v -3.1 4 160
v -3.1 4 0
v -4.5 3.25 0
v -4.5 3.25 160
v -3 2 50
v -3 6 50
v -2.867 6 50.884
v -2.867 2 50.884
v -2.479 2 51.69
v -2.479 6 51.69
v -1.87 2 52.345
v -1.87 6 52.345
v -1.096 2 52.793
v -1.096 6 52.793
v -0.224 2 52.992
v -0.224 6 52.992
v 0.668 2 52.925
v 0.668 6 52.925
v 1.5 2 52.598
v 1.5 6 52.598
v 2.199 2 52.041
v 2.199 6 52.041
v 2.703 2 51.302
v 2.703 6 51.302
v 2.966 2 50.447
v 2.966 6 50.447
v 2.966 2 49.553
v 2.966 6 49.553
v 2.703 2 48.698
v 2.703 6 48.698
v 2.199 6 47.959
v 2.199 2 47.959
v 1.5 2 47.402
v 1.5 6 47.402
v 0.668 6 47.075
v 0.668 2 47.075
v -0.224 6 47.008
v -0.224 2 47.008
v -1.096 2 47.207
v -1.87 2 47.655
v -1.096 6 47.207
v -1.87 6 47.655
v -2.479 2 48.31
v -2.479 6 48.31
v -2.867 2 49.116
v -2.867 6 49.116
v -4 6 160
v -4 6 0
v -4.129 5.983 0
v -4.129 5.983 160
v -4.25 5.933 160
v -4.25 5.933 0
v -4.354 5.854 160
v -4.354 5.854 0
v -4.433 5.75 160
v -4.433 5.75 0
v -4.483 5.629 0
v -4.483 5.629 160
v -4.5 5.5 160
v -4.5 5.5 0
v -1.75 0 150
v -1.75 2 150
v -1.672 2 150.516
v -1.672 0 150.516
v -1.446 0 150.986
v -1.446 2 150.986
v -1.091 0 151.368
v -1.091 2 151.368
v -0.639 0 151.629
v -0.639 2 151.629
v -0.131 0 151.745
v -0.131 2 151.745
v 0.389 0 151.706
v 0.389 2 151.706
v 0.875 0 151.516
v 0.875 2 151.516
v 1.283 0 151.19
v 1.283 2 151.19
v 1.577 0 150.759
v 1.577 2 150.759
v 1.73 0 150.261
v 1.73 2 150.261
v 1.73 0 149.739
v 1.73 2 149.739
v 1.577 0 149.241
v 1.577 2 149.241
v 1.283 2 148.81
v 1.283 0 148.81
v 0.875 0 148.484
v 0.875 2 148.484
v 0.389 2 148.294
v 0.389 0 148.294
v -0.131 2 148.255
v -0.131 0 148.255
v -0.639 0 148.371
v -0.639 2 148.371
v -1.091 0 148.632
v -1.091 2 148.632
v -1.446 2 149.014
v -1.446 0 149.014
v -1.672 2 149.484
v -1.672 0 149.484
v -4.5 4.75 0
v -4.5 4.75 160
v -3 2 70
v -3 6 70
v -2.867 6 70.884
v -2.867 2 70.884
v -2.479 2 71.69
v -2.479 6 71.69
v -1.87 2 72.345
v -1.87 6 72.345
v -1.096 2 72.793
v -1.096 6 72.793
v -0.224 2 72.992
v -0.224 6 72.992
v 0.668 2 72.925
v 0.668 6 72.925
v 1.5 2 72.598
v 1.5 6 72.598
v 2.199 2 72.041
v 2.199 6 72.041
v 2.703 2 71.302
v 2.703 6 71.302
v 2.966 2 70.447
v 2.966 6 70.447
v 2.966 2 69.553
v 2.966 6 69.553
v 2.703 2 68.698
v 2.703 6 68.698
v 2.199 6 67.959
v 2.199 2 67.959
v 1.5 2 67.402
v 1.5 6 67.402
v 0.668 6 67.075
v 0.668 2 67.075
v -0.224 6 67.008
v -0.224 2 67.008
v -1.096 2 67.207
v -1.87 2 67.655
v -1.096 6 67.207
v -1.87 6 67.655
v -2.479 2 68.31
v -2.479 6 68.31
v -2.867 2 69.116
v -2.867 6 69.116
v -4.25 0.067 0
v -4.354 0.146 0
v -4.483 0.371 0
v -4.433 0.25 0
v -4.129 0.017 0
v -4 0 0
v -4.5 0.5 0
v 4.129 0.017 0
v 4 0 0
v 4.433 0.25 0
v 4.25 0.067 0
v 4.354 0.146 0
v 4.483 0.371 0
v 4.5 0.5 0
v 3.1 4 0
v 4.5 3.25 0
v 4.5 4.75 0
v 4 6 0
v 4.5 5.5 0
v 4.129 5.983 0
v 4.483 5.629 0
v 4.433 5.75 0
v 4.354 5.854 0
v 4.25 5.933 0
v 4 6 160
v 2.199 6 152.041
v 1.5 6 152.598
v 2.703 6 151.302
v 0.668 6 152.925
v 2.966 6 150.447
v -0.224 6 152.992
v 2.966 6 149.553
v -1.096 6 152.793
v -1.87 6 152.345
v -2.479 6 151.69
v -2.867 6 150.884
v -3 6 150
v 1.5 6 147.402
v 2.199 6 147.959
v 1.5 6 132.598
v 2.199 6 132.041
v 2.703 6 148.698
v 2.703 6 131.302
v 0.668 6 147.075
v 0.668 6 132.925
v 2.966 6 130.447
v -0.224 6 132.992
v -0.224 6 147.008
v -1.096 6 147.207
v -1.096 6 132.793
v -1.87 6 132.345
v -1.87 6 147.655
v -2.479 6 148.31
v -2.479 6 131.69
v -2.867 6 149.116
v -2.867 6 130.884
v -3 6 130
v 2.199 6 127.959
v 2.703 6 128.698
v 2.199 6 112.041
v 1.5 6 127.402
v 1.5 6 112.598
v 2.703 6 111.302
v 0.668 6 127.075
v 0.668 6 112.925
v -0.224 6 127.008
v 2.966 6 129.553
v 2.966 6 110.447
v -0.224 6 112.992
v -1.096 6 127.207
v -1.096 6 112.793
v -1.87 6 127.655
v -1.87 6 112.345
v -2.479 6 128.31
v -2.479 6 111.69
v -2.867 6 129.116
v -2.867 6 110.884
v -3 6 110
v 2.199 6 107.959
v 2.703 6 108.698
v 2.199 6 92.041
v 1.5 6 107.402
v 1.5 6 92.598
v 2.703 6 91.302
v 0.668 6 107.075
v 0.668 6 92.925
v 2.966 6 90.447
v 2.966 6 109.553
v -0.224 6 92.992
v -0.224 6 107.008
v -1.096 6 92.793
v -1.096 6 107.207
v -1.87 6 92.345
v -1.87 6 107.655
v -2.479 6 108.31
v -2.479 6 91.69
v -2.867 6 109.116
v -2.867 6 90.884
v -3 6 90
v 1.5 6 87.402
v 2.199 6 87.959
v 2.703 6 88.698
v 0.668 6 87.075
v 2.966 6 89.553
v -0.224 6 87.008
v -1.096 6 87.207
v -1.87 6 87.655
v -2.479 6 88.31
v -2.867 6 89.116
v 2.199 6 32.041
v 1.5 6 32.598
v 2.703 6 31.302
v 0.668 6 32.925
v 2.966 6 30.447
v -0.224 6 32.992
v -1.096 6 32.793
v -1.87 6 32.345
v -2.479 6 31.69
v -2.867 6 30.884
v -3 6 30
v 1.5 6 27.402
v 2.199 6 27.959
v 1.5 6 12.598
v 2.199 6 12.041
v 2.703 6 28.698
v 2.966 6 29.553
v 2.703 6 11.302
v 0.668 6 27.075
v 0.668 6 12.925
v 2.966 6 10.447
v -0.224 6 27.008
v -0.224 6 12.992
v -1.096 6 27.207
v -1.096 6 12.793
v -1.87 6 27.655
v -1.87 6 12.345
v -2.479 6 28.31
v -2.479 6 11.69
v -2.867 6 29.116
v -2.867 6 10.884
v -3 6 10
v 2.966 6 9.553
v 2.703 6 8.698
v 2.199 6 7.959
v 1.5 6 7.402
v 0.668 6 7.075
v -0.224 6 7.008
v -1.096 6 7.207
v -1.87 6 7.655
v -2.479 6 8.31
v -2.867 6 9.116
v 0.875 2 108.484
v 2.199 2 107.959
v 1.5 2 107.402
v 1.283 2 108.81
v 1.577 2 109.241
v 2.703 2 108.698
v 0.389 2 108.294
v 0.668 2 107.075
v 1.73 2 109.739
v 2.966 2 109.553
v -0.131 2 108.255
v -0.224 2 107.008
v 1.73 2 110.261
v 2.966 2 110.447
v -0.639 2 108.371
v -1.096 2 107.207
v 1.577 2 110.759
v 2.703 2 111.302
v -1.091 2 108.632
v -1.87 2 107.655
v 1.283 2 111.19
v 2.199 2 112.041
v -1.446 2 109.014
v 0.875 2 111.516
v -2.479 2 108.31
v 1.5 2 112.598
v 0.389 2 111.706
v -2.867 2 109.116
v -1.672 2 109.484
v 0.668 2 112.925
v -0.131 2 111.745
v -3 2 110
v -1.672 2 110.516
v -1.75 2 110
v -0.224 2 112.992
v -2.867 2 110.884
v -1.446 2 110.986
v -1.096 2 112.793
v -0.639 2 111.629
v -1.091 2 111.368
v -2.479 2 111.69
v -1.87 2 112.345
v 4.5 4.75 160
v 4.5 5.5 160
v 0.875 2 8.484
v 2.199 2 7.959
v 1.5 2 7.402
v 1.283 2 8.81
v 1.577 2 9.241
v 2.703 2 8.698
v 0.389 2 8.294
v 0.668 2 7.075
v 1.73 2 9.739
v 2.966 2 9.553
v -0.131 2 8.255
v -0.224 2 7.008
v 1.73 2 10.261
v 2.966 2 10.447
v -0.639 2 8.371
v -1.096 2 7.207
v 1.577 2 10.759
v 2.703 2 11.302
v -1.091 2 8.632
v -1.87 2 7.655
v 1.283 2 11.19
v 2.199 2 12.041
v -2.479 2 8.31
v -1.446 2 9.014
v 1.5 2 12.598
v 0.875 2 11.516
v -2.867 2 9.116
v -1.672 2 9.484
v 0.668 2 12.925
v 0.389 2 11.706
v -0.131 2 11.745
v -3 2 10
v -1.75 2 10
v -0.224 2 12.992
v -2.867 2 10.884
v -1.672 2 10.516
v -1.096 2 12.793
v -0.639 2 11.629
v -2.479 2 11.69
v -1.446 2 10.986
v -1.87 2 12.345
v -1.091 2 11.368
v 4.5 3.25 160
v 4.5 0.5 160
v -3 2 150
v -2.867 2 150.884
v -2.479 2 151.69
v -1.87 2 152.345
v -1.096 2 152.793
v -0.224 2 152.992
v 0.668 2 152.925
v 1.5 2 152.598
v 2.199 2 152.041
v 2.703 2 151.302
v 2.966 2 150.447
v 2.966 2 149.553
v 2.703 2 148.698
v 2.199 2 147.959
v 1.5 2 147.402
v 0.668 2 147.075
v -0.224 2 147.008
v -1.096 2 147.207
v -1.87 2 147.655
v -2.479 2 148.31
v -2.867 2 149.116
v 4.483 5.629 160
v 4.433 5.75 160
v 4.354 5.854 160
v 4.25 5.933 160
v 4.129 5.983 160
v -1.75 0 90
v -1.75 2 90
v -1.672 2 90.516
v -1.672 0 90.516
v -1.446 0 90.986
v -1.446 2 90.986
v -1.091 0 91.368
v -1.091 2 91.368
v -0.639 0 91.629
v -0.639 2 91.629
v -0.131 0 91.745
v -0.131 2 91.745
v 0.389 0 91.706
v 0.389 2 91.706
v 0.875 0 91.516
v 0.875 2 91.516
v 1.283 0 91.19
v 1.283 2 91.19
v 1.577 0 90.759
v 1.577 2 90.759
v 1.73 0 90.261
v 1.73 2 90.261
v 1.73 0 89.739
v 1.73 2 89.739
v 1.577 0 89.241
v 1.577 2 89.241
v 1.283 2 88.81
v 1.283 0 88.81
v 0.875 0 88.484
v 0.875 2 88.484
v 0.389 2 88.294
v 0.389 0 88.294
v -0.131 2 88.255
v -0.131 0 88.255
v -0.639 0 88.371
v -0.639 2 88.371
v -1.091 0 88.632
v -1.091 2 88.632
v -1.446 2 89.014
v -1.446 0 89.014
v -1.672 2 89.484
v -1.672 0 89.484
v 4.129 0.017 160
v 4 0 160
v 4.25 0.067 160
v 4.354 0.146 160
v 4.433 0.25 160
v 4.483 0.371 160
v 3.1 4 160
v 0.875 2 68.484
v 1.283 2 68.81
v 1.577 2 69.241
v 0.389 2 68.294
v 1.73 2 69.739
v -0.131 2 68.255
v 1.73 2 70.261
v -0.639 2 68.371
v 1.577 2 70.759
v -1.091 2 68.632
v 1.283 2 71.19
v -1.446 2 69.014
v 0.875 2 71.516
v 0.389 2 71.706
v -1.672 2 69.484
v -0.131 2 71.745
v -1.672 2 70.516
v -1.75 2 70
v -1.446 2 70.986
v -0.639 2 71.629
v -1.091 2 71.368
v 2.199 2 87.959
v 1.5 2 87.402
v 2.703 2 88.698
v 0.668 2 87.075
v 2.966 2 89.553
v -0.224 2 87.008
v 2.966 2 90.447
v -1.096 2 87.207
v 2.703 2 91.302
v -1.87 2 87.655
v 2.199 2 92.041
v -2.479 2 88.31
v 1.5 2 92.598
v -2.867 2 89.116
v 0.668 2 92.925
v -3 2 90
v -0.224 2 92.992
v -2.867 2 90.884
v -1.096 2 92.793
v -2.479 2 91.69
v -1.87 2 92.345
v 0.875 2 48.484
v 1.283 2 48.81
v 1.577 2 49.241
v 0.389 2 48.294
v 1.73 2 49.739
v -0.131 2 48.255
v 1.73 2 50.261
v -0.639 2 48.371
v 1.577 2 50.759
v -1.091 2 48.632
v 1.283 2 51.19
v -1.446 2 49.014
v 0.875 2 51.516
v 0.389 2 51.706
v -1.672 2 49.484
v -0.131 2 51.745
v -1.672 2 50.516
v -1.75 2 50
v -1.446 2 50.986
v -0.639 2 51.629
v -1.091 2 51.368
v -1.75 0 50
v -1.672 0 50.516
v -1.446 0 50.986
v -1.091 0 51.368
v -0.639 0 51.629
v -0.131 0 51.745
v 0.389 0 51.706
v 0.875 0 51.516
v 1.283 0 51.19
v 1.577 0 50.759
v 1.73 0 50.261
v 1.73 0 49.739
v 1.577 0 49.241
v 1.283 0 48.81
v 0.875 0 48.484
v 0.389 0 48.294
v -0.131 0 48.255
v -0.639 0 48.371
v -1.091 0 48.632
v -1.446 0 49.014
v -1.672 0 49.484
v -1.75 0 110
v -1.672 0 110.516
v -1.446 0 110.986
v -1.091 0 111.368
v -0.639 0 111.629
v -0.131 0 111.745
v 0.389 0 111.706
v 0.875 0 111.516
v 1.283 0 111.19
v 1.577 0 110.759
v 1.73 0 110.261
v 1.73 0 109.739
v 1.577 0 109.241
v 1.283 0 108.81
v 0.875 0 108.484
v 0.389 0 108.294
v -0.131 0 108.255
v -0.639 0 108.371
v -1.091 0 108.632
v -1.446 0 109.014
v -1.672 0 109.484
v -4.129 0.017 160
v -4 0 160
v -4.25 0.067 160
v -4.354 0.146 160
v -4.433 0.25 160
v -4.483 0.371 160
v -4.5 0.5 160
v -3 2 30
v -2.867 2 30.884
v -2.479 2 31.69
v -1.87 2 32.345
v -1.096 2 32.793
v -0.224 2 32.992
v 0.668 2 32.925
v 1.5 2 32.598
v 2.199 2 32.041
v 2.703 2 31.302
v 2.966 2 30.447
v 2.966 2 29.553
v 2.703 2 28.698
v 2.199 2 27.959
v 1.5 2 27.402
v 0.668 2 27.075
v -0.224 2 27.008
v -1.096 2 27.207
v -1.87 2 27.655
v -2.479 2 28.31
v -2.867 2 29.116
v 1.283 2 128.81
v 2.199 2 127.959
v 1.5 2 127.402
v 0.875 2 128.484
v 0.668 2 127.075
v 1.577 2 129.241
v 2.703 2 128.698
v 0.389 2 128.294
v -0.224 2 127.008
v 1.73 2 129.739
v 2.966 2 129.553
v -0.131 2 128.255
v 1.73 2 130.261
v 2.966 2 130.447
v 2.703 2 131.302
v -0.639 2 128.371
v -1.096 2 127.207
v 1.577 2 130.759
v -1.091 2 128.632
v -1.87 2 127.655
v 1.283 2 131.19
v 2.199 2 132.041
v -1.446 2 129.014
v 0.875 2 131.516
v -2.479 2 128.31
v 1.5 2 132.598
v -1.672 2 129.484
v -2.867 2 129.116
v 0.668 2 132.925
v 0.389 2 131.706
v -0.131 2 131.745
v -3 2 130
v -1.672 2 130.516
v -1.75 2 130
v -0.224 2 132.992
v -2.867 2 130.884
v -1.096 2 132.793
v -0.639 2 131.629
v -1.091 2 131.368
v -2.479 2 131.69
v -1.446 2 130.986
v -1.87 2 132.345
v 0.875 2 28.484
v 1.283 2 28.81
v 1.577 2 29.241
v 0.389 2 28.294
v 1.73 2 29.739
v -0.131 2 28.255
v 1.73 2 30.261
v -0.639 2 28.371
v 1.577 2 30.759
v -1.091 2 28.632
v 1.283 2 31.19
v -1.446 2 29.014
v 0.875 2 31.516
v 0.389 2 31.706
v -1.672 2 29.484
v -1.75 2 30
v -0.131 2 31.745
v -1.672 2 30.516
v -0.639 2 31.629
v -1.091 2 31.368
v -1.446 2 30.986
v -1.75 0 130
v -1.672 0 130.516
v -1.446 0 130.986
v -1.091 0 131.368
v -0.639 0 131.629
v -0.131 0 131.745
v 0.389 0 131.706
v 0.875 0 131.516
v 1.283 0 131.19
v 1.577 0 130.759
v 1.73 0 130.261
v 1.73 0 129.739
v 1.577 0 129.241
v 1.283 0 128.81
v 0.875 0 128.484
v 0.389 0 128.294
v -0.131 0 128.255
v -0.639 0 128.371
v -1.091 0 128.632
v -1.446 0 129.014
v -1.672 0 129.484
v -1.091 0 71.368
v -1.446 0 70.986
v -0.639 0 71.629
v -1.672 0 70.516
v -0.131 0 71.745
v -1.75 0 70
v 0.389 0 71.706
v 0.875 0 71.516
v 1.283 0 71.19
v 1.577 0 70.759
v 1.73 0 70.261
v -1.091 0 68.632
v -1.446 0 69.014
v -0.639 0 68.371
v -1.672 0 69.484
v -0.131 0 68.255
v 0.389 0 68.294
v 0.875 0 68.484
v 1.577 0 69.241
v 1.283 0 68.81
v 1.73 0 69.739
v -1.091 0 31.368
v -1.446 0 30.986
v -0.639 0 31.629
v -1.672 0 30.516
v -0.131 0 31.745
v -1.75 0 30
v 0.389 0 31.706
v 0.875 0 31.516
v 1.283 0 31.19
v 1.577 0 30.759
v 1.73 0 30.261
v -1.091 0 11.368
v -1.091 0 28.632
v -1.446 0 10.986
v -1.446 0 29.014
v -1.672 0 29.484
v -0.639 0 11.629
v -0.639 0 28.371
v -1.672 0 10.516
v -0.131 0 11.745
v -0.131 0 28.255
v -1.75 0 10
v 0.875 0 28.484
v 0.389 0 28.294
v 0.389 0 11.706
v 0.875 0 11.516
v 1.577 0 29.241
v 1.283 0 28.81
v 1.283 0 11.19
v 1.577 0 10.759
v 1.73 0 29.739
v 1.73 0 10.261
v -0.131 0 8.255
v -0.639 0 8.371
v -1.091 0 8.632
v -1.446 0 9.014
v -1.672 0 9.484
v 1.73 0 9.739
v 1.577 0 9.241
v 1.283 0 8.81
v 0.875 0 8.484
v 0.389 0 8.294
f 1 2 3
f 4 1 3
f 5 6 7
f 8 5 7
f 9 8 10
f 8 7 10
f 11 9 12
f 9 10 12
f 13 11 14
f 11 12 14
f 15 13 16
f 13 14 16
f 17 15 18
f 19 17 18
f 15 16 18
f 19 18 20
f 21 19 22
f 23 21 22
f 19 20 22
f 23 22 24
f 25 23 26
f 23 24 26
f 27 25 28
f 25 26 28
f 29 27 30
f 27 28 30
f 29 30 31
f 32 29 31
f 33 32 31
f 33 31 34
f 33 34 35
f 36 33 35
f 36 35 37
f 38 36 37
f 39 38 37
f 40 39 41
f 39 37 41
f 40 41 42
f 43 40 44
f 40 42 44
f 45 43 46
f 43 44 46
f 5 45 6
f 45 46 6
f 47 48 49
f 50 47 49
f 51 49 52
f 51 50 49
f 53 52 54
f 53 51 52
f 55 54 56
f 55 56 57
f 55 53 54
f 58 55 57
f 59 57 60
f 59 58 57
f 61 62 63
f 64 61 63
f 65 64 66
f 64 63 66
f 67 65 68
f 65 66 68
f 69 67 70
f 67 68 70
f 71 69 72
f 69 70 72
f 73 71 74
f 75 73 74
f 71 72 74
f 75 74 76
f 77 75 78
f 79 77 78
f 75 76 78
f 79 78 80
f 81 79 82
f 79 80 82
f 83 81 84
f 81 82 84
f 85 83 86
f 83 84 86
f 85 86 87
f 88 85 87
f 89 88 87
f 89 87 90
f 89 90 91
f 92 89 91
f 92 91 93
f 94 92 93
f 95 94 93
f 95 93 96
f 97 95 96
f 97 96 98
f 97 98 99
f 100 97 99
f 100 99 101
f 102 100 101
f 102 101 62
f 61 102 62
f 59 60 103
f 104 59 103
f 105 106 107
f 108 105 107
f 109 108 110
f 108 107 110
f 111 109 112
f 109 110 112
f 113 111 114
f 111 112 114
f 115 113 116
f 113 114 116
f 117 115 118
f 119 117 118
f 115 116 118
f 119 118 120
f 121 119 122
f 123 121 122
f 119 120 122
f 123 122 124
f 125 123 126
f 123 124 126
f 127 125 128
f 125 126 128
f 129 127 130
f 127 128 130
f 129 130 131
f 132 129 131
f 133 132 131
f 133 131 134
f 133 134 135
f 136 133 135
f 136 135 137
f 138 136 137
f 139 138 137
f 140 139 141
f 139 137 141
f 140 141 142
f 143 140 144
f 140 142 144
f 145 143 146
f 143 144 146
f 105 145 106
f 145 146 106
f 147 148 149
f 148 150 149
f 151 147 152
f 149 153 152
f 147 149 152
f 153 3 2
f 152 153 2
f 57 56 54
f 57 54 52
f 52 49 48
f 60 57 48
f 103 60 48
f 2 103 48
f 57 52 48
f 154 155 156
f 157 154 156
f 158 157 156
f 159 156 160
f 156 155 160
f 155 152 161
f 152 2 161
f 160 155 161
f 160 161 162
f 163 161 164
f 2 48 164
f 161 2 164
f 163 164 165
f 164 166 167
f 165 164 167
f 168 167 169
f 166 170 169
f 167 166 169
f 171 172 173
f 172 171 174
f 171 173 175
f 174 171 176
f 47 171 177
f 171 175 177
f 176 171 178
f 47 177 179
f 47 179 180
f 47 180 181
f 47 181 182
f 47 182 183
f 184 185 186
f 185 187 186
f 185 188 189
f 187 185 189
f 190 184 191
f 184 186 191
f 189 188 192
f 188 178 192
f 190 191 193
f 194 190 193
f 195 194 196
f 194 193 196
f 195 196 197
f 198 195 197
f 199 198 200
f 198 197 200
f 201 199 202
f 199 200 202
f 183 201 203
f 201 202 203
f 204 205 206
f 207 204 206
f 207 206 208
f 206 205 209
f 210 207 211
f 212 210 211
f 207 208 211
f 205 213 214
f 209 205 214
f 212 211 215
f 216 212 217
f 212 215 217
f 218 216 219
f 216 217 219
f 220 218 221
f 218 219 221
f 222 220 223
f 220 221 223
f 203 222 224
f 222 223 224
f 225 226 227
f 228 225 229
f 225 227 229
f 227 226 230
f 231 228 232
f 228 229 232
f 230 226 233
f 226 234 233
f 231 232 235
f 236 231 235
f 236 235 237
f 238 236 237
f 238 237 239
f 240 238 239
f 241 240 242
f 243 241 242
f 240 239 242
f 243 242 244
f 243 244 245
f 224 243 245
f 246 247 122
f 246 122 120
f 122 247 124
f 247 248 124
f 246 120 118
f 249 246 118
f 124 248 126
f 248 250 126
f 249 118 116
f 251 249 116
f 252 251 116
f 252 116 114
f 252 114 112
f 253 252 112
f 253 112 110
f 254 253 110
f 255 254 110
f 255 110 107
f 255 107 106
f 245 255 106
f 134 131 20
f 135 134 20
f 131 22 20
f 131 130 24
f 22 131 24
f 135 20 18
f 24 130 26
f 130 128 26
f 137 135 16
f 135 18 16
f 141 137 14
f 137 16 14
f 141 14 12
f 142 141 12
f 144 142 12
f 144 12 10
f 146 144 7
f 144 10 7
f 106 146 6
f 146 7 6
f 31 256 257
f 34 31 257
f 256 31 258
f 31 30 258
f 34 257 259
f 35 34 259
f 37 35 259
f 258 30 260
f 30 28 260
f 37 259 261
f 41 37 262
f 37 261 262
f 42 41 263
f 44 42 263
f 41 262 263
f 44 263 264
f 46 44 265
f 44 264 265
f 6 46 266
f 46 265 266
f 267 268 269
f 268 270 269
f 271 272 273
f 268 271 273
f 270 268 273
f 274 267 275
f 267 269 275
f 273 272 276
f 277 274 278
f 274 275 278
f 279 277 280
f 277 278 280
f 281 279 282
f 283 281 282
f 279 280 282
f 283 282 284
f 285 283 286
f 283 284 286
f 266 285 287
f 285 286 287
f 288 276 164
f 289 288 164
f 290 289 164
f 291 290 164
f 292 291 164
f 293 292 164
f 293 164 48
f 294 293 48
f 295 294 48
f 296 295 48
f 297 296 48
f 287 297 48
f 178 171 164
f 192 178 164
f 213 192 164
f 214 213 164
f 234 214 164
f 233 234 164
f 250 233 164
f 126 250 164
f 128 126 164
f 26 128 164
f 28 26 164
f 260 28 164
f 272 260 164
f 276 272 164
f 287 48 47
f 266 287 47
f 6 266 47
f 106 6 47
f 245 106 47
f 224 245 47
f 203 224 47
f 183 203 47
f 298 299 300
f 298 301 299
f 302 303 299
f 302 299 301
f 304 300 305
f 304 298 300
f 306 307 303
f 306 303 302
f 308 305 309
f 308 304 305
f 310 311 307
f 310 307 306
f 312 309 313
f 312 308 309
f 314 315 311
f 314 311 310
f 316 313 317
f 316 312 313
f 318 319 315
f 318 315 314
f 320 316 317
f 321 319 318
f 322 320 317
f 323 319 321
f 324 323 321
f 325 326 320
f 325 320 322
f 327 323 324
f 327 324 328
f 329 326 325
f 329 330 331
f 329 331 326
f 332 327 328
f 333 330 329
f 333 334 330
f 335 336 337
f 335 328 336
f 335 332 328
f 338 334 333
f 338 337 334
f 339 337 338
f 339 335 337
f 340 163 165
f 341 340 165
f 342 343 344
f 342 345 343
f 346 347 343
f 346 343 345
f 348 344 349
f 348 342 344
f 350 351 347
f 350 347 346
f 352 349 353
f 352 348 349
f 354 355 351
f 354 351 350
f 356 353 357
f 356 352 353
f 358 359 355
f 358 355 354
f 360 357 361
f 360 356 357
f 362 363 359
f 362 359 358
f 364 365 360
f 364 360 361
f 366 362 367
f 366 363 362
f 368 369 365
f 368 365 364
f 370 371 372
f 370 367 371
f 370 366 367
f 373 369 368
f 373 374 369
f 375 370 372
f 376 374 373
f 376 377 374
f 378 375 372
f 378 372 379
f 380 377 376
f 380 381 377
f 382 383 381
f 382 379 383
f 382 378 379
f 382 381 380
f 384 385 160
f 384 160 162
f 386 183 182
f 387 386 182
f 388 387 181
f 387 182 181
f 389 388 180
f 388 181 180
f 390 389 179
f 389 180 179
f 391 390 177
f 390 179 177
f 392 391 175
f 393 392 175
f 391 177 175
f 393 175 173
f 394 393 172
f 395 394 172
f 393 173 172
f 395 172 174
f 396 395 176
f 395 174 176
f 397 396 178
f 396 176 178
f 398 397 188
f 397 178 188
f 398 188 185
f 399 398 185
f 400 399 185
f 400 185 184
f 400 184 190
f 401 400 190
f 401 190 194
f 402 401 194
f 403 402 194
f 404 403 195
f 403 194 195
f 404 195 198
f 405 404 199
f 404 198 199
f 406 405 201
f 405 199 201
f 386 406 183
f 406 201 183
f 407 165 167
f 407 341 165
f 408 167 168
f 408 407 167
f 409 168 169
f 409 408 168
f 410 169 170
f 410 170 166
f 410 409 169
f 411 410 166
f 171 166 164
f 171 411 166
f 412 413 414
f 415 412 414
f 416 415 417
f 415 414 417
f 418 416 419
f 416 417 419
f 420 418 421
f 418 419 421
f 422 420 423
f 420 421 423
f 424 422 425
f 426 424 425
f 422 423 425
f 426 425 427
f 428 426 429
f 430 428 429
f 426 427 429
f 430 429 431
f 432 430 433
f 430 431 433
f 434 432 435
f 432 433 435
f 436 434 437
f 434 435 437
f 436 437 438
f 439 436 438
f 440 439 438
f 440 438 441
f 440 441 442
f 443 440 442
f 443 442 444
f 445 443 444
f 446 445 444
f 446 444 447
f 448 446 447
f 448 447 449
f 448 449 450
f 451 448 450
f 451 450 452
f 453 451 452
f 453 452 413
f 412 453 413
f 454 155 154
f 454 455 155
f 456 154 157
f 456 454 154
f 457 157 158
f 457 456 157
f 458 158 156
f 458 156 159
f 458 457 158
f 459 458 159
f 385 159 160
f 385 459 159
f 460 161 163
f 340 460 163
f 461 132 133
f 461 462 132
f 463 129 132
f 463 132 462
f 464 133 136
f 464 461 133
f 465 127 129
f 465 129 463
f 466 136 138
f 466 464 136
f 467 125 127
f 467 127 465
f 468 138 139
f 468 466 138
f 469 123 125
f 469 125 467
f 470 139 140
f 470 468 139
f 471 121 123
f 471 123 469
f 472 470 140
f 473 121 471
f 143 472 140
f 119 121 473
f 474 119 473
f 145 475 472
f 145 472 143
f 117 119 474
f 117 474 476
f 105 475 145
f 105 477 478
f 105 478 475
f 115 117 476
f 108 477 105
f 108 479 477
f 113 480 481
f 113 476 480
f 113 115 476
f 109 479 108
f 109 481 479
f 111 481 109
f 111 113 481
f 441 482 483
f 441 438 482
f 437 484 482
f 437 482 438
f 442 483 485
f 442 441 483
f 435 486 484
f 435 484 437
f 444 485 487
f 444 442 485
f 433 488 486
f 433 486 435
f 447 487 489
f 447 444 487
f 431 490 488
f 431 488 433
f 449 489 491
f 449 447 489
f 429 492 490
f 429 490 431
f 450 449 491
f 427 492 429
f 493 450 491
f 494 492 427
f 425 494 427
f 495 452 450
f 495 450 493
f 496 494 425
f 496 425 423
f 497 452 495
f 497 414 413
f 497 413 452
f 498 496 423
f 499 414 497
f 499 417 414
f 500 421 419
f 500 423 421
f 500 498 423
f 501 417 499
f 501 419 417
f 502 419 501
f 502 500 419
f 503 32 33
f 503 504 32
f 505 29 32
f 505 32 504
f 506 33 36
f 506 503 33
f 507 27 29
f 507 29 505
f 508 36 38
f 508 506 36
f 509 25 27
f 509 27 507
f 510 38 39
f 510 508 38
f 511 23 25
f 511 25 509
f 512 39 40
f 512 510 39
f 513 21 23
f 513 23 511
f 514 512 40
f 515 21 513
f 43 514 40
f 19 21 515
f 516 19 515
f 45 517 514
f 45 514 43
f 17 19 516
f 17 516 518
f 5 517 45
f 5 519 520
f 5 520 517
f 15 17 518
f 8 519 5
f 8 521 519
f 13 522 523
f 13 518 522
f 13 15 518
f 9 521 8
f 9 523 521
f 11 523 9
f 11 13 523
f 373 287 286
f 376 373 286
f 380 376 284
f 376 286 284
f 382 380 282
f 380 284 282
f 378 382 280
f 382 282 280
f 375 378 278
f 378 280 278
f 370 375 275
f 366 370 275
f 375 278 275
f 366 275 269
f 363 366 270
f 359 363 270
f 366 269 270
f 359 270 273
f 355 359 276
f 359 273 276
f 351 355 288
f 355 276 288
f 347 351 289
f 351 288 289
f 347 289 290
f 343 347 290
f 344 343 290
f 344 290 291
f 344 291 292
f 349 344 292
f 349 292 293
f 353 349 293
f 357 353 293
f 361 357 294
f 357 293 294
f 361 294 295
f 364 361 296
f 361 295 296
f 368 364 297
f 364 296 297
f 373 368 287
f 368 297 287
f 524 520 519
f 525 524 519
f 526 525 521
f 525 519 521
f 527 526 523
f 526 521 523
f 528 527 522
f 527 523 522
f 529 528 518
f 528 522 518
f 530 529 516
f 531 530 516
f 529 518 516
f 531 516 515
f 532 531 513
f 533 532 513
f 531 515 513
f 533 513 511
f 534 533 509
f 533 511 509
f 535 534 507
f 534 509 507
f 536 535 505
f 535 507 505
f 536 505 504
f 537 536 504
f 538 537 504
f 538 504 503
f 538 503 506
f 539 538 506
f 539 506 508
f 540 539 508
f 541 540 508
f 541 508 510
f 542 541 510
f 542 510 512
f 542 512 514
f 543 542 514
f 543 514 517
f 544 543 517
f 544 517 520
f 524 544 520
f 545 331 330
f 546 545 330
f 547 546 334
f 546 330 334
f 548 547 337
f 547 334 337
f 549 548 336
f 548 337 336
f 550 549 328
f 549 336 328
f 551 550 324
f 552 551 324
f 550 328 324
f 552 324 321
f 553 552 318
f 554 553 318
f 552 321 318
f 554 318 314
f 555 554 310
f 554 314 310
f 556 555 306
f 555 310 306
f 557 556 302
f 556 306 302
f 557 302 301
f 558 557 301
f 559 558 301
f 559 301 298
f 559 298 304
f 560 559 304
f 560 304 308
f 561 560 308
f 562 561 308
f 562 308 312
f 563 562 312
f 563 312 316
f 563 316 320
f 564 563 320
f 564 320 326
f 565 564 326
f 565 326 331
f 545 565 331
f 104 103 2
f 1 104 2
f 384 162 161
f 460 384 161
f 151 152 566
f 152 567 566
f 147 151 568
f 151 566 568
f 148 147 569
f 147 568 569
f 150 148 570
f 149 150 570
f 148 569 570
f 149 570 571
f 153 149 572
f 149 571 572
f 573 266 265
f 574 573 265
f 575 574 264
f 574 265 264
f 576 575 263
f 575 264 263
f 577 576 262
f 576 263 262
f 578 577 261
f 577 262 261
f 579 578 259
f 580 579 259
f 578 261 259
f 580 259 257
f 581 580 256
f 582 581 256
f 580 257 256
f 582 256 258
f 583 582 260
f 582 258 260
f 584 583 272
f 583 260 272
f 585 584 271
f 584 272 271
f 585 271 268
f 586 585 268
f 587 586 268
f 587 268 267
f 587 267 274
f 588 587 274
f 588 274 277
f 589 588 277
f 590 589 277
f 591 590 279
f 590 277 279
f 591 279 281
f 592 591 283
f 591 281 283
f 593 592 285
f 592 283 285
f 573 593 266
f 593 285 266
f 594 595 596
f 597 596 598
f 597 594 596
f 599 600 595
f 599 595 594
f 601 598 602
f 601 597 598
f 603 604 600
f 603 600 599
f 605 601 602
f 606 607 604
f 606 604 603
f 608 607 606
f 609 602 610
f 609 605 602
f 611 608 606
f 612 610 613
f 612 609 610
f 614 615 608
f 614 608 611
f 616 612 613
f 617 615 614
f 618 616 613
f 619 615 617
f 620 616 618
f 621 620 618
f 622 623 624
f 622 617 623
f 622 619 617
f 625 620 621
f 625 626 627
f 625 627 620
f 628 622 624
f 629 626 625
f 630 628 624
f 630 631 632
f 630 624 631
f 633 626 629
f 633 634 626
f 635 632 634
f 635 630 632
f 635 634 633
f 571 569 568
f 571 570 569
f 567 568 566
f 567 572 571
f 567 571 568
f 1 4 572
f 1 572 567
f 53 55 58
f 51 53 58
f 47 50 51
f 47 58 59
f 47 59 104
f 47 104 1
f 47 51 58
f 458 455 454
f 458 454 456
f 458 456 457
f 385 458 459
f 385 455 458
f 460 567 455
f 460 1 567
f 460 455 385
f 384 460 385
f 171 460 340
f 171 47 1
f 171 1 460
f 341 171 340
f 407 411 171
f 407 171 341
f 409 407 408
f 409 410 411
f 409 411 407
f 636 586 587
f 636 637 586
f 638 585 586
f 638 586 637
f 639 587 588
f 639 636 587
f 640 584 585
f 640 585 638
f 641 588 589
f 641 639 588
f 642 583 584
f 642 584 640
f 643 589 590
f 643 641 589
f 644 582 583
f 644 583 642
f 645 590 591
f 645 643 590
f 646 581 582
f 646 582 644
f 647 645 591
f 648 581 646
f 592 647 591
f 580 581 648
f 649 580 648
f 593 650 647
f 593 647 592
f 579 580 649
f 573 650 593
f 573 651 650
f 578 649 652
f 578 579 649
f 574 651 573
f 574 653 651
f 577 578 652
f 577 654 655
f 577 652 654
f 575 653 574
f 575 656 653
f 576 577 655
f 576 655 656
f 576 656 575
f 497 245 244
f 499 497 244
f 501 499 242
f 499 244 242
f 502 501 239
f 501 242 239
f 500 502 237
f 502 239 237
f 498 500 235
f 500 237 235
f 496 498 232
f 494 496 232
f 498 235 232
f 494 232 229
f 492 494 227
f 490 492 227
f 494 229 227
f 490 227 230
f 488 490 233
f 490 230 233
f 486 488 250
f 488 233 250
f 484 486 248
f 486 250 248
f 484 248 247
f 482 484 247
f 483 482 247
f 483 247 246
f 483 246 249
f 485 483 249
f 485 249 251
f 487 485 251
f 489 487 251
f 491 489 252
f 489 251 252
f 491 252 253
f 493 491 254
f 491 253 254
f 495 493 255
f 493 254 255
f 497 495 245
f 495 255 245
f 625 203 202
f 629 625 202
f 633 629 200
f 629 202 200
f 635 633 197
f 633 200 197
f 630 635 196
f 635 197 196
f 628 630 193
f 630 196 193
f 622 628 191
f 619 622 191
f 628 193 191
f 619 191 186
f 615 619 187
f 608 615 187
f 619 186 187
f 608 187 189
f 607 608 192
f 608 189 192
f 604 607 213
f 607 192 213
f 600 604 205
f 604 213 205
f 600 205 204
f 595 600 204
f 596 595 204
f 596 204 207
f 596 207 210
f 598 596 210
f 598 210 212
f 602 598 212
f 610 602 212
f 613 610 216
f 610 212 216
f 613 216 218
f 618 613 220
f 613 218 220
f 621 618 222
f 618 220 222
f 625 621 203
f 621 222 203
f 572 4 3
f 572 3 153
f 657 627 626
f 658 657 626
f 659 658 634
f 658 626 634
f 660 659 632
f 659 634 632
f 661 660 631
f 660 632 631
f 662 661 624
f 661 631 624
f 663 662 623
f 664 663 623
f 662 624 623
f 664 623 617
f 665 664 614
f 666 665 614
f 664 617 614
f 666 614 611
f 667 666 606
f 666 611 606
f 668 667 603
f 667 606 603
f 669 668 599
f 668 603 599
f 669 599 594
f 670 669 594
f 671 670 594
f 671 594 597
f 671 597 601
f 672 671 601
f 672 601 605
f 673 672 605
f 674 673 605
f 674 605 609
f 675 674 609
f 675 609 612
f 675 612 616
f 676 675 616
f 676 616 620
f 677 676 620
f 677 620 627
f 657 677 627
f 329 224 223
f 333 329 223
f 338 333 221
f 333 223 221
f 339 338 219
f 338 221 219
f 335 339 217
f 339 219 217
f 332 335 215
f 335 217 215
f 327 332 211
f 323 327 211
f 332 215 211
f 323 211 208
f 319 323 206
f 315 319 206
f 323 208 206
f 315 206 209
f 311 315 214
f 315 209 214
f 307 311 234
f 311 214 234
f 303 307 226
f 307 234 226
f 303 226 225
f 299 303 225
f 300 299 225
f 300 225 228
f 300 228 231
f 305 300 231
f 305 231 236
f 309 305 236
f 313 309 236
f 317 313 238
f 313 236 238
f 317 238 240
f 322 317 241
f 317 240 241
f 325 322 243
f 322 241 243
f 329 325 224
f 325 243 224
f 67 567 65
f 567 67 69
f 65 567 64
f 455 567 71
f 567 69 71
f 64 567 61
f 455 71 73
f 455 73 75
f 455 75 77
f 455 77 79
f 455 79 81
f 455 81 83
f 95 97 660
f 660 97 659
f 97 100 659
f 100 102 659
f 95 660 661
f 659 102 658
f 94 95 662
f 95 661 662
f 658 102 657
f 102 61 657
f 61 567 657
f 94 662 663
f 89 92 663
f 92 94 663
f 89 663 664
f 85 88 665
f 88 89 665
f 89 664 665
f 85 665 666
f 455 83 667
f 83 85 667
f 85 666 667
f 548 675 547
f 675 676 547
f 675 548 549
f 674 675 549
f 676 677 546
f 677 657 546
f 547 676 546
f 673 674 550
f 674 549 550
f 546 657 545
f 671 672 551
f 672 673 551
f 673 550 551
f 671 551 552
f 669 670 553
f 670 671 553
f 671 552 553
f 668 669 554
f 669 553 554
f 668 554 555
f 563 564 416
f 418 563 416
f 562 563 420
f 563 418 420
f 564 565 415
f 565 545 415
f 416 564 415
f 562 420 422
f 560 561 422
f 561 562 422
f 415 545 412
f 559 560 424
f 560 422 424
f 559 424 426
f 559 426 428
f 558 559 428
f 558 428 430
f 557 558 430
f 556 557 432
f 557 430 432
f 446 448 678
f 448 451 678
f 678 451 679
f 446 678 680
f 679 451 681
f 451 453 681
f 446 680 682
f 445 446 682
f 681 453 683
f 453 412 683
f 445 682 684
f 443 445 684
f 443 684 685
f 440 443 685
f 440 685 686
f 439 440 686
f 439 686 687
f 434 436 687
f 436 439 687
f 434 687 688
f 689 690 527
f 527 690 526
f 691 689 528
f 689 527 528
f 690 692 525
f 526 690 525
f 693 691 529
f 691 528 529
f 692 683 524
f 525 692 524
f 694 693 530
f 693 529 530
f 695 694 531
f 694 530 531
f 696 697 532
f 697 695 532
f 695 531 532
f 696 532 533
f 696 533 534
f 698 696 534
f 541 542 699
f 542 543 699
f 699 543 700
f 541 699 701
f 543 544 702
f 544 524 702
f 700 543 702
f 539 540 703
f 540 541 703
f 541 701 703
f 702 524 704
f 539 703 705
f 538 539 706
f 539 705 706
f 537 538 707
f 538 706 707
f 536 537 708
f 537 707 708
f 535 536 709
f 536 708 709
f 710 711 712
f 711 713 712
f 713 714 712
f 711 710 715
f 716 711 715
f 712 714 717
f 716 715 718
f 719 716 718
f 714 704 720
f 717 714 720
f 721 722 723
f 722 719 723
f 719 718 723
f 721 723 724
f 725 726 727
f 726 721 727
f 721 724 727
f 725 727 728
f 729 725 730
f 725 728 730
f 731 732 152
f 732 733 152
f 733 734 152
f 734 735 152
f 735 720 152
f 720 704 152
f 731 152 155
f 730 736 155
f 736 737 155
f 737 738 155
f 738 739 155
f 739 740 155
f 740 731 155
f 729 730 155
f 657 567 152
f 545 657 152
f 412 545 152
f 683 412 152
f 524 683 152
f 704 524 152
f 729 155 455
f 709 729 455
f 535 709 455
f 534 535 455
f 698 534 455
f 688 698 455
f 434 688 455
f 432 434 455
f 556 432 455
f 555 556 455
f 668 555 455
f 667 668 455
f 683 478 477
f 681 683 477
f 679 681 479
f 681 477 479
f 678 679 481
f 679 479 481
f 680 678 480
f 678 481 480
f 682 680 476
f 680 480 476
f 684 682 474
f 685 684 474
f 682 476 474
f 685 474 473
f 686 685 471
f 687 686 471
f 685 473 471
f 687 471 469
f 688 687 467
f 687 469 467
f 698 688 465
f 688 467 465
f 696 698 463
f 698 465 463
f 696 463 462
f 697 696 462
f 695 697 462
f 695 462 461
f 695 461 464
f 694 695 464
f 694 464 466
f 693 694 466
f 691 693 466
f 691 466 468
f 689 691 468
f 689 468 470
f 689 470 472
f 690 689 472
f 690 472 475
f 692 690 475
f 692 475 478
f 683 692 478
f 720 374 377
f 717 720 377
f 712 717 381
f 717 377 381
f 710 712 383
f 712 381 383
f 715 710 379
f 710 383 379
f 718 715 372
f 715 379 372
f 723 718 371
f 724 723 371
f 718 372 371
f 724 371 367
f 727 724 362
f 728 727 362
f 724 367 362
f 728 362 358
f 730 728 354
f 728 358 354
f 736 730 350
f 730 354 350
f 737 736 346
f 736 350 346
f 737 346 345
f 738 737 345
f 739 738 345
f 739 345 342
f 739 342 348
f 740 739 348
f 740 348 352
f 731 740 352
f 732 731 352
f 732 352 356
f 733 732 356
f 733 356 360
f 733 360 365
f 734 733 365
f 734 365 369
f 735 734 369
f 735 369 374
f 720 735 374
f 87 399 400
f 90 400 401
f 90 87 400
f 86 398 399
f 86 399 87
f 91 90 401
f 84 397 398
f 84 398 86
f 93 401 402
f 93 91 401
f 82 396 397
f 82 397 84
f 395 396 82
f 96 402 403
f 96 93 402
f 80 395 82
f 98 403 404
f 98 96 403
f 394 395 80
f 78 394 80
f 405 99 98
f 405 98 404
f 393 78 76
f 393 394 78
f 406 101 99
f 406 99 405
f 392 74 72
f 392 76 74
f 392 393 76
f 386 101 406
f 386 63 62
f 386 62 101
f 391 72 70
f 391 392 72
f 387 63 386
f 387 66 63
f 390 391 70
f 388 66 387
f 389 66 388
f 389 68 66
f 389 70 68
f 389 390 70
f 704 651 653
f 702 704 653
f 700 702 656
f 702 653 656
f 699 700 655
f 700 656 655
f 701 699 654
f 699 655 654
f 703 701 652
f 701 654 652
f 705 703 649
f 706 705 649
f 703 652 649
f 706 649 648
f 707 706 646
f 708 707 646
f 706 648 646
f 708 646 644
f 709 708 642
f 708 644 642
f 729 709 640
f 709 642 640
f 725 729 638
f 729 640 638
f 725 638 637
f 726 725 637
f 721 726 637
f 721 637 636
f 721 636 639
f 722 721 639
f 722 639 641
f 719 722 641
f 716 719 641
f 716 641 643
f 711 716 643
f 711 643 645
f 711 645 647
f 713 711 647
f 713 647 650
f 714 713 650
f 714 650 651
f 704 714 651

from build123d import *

# Parameters (mm, degrees)
BOSS_EXTRUDE1_DEPTH = 160
FILLET1_R           = 0.5
SKETCH2_R           = 3
CUT_EXTRUDE1_DEPTH  = 4
SKETCH3_R           = 1.75
CUT_EXTRUDE2_DEPTH  = 161.113241176
LPATTERN1_COUNT     = 8
LPATTERN1_PITCH     = 20


with BuildPart() as part:
    # Sketch1 → Boss-Extrude1 (new body)
    with BuildSketch(Plane.XY):
        Polygon((-4.5, 0), (4.5, 0), (4.5, 3.25), (3.1, 4), (4.5, 4.75), (4.5, 6), (-4.5, 6), (-4.5, 4.75), (-3.1, 4), (-4.5, 3.25), align=None)
    extrude(amount=BOSS_EXTRUDE1_DEPTH)

    # Fillet1
    fillet1_edges = [part.edges().sort_by_distance(p)[0] for p in [
        (-4.5, 6, 80),
        (4.5, 6, 80),
        (4.5, 0, 80),
        (-4.5, 0, 80),
    ]]
    fillet(fillet1_edges, radius=FILLET1_R)

    # Sketch2 → Cut-Extrude1 (cut)
    with BuildSketch(Plane(origin=(0, 6, 0), x_dir=(1, 0, 0), z_dir=(0, 1, 0))):
        with Locations(Location((0, -10, 0), (0, 0, 180))):
            Circle(SKETCH2_R)
    cut_extrude1 = extrude(amount=-CUT_EXTRUDE1_DEPTH, mode=Mode.SUBTRACT)

    # Sketch3 → Cut-Extrude2 (cut, through all)
    with BuildSketch(Plane(origin=(0, 2, 0), x_dir=(1, 0, 0), z_dir=(0, 1, 0))):
        with Locations(Location((0, -10, 0), (0, 0, 180))):
            Circle(SKETCH3_R)
    cut_extrude2 = extrude(amount=-CUT_EXTRUDE2_DEPTH, mode=Mode.SUBTRACT)

    # LPattern1: Cut-Extrude1, Cut-Extrude2 ×8
    with Locations(*[(0, 0, i * LPATTERN1_PITCH) for i in range(1, LPATTERN1_COUNT)]):
        add(cut_extrude1, mode=Mode.SUBTRACT)
        add(cut_extrude2, mode=Mode.SUBTRACT)


solid = part.part
